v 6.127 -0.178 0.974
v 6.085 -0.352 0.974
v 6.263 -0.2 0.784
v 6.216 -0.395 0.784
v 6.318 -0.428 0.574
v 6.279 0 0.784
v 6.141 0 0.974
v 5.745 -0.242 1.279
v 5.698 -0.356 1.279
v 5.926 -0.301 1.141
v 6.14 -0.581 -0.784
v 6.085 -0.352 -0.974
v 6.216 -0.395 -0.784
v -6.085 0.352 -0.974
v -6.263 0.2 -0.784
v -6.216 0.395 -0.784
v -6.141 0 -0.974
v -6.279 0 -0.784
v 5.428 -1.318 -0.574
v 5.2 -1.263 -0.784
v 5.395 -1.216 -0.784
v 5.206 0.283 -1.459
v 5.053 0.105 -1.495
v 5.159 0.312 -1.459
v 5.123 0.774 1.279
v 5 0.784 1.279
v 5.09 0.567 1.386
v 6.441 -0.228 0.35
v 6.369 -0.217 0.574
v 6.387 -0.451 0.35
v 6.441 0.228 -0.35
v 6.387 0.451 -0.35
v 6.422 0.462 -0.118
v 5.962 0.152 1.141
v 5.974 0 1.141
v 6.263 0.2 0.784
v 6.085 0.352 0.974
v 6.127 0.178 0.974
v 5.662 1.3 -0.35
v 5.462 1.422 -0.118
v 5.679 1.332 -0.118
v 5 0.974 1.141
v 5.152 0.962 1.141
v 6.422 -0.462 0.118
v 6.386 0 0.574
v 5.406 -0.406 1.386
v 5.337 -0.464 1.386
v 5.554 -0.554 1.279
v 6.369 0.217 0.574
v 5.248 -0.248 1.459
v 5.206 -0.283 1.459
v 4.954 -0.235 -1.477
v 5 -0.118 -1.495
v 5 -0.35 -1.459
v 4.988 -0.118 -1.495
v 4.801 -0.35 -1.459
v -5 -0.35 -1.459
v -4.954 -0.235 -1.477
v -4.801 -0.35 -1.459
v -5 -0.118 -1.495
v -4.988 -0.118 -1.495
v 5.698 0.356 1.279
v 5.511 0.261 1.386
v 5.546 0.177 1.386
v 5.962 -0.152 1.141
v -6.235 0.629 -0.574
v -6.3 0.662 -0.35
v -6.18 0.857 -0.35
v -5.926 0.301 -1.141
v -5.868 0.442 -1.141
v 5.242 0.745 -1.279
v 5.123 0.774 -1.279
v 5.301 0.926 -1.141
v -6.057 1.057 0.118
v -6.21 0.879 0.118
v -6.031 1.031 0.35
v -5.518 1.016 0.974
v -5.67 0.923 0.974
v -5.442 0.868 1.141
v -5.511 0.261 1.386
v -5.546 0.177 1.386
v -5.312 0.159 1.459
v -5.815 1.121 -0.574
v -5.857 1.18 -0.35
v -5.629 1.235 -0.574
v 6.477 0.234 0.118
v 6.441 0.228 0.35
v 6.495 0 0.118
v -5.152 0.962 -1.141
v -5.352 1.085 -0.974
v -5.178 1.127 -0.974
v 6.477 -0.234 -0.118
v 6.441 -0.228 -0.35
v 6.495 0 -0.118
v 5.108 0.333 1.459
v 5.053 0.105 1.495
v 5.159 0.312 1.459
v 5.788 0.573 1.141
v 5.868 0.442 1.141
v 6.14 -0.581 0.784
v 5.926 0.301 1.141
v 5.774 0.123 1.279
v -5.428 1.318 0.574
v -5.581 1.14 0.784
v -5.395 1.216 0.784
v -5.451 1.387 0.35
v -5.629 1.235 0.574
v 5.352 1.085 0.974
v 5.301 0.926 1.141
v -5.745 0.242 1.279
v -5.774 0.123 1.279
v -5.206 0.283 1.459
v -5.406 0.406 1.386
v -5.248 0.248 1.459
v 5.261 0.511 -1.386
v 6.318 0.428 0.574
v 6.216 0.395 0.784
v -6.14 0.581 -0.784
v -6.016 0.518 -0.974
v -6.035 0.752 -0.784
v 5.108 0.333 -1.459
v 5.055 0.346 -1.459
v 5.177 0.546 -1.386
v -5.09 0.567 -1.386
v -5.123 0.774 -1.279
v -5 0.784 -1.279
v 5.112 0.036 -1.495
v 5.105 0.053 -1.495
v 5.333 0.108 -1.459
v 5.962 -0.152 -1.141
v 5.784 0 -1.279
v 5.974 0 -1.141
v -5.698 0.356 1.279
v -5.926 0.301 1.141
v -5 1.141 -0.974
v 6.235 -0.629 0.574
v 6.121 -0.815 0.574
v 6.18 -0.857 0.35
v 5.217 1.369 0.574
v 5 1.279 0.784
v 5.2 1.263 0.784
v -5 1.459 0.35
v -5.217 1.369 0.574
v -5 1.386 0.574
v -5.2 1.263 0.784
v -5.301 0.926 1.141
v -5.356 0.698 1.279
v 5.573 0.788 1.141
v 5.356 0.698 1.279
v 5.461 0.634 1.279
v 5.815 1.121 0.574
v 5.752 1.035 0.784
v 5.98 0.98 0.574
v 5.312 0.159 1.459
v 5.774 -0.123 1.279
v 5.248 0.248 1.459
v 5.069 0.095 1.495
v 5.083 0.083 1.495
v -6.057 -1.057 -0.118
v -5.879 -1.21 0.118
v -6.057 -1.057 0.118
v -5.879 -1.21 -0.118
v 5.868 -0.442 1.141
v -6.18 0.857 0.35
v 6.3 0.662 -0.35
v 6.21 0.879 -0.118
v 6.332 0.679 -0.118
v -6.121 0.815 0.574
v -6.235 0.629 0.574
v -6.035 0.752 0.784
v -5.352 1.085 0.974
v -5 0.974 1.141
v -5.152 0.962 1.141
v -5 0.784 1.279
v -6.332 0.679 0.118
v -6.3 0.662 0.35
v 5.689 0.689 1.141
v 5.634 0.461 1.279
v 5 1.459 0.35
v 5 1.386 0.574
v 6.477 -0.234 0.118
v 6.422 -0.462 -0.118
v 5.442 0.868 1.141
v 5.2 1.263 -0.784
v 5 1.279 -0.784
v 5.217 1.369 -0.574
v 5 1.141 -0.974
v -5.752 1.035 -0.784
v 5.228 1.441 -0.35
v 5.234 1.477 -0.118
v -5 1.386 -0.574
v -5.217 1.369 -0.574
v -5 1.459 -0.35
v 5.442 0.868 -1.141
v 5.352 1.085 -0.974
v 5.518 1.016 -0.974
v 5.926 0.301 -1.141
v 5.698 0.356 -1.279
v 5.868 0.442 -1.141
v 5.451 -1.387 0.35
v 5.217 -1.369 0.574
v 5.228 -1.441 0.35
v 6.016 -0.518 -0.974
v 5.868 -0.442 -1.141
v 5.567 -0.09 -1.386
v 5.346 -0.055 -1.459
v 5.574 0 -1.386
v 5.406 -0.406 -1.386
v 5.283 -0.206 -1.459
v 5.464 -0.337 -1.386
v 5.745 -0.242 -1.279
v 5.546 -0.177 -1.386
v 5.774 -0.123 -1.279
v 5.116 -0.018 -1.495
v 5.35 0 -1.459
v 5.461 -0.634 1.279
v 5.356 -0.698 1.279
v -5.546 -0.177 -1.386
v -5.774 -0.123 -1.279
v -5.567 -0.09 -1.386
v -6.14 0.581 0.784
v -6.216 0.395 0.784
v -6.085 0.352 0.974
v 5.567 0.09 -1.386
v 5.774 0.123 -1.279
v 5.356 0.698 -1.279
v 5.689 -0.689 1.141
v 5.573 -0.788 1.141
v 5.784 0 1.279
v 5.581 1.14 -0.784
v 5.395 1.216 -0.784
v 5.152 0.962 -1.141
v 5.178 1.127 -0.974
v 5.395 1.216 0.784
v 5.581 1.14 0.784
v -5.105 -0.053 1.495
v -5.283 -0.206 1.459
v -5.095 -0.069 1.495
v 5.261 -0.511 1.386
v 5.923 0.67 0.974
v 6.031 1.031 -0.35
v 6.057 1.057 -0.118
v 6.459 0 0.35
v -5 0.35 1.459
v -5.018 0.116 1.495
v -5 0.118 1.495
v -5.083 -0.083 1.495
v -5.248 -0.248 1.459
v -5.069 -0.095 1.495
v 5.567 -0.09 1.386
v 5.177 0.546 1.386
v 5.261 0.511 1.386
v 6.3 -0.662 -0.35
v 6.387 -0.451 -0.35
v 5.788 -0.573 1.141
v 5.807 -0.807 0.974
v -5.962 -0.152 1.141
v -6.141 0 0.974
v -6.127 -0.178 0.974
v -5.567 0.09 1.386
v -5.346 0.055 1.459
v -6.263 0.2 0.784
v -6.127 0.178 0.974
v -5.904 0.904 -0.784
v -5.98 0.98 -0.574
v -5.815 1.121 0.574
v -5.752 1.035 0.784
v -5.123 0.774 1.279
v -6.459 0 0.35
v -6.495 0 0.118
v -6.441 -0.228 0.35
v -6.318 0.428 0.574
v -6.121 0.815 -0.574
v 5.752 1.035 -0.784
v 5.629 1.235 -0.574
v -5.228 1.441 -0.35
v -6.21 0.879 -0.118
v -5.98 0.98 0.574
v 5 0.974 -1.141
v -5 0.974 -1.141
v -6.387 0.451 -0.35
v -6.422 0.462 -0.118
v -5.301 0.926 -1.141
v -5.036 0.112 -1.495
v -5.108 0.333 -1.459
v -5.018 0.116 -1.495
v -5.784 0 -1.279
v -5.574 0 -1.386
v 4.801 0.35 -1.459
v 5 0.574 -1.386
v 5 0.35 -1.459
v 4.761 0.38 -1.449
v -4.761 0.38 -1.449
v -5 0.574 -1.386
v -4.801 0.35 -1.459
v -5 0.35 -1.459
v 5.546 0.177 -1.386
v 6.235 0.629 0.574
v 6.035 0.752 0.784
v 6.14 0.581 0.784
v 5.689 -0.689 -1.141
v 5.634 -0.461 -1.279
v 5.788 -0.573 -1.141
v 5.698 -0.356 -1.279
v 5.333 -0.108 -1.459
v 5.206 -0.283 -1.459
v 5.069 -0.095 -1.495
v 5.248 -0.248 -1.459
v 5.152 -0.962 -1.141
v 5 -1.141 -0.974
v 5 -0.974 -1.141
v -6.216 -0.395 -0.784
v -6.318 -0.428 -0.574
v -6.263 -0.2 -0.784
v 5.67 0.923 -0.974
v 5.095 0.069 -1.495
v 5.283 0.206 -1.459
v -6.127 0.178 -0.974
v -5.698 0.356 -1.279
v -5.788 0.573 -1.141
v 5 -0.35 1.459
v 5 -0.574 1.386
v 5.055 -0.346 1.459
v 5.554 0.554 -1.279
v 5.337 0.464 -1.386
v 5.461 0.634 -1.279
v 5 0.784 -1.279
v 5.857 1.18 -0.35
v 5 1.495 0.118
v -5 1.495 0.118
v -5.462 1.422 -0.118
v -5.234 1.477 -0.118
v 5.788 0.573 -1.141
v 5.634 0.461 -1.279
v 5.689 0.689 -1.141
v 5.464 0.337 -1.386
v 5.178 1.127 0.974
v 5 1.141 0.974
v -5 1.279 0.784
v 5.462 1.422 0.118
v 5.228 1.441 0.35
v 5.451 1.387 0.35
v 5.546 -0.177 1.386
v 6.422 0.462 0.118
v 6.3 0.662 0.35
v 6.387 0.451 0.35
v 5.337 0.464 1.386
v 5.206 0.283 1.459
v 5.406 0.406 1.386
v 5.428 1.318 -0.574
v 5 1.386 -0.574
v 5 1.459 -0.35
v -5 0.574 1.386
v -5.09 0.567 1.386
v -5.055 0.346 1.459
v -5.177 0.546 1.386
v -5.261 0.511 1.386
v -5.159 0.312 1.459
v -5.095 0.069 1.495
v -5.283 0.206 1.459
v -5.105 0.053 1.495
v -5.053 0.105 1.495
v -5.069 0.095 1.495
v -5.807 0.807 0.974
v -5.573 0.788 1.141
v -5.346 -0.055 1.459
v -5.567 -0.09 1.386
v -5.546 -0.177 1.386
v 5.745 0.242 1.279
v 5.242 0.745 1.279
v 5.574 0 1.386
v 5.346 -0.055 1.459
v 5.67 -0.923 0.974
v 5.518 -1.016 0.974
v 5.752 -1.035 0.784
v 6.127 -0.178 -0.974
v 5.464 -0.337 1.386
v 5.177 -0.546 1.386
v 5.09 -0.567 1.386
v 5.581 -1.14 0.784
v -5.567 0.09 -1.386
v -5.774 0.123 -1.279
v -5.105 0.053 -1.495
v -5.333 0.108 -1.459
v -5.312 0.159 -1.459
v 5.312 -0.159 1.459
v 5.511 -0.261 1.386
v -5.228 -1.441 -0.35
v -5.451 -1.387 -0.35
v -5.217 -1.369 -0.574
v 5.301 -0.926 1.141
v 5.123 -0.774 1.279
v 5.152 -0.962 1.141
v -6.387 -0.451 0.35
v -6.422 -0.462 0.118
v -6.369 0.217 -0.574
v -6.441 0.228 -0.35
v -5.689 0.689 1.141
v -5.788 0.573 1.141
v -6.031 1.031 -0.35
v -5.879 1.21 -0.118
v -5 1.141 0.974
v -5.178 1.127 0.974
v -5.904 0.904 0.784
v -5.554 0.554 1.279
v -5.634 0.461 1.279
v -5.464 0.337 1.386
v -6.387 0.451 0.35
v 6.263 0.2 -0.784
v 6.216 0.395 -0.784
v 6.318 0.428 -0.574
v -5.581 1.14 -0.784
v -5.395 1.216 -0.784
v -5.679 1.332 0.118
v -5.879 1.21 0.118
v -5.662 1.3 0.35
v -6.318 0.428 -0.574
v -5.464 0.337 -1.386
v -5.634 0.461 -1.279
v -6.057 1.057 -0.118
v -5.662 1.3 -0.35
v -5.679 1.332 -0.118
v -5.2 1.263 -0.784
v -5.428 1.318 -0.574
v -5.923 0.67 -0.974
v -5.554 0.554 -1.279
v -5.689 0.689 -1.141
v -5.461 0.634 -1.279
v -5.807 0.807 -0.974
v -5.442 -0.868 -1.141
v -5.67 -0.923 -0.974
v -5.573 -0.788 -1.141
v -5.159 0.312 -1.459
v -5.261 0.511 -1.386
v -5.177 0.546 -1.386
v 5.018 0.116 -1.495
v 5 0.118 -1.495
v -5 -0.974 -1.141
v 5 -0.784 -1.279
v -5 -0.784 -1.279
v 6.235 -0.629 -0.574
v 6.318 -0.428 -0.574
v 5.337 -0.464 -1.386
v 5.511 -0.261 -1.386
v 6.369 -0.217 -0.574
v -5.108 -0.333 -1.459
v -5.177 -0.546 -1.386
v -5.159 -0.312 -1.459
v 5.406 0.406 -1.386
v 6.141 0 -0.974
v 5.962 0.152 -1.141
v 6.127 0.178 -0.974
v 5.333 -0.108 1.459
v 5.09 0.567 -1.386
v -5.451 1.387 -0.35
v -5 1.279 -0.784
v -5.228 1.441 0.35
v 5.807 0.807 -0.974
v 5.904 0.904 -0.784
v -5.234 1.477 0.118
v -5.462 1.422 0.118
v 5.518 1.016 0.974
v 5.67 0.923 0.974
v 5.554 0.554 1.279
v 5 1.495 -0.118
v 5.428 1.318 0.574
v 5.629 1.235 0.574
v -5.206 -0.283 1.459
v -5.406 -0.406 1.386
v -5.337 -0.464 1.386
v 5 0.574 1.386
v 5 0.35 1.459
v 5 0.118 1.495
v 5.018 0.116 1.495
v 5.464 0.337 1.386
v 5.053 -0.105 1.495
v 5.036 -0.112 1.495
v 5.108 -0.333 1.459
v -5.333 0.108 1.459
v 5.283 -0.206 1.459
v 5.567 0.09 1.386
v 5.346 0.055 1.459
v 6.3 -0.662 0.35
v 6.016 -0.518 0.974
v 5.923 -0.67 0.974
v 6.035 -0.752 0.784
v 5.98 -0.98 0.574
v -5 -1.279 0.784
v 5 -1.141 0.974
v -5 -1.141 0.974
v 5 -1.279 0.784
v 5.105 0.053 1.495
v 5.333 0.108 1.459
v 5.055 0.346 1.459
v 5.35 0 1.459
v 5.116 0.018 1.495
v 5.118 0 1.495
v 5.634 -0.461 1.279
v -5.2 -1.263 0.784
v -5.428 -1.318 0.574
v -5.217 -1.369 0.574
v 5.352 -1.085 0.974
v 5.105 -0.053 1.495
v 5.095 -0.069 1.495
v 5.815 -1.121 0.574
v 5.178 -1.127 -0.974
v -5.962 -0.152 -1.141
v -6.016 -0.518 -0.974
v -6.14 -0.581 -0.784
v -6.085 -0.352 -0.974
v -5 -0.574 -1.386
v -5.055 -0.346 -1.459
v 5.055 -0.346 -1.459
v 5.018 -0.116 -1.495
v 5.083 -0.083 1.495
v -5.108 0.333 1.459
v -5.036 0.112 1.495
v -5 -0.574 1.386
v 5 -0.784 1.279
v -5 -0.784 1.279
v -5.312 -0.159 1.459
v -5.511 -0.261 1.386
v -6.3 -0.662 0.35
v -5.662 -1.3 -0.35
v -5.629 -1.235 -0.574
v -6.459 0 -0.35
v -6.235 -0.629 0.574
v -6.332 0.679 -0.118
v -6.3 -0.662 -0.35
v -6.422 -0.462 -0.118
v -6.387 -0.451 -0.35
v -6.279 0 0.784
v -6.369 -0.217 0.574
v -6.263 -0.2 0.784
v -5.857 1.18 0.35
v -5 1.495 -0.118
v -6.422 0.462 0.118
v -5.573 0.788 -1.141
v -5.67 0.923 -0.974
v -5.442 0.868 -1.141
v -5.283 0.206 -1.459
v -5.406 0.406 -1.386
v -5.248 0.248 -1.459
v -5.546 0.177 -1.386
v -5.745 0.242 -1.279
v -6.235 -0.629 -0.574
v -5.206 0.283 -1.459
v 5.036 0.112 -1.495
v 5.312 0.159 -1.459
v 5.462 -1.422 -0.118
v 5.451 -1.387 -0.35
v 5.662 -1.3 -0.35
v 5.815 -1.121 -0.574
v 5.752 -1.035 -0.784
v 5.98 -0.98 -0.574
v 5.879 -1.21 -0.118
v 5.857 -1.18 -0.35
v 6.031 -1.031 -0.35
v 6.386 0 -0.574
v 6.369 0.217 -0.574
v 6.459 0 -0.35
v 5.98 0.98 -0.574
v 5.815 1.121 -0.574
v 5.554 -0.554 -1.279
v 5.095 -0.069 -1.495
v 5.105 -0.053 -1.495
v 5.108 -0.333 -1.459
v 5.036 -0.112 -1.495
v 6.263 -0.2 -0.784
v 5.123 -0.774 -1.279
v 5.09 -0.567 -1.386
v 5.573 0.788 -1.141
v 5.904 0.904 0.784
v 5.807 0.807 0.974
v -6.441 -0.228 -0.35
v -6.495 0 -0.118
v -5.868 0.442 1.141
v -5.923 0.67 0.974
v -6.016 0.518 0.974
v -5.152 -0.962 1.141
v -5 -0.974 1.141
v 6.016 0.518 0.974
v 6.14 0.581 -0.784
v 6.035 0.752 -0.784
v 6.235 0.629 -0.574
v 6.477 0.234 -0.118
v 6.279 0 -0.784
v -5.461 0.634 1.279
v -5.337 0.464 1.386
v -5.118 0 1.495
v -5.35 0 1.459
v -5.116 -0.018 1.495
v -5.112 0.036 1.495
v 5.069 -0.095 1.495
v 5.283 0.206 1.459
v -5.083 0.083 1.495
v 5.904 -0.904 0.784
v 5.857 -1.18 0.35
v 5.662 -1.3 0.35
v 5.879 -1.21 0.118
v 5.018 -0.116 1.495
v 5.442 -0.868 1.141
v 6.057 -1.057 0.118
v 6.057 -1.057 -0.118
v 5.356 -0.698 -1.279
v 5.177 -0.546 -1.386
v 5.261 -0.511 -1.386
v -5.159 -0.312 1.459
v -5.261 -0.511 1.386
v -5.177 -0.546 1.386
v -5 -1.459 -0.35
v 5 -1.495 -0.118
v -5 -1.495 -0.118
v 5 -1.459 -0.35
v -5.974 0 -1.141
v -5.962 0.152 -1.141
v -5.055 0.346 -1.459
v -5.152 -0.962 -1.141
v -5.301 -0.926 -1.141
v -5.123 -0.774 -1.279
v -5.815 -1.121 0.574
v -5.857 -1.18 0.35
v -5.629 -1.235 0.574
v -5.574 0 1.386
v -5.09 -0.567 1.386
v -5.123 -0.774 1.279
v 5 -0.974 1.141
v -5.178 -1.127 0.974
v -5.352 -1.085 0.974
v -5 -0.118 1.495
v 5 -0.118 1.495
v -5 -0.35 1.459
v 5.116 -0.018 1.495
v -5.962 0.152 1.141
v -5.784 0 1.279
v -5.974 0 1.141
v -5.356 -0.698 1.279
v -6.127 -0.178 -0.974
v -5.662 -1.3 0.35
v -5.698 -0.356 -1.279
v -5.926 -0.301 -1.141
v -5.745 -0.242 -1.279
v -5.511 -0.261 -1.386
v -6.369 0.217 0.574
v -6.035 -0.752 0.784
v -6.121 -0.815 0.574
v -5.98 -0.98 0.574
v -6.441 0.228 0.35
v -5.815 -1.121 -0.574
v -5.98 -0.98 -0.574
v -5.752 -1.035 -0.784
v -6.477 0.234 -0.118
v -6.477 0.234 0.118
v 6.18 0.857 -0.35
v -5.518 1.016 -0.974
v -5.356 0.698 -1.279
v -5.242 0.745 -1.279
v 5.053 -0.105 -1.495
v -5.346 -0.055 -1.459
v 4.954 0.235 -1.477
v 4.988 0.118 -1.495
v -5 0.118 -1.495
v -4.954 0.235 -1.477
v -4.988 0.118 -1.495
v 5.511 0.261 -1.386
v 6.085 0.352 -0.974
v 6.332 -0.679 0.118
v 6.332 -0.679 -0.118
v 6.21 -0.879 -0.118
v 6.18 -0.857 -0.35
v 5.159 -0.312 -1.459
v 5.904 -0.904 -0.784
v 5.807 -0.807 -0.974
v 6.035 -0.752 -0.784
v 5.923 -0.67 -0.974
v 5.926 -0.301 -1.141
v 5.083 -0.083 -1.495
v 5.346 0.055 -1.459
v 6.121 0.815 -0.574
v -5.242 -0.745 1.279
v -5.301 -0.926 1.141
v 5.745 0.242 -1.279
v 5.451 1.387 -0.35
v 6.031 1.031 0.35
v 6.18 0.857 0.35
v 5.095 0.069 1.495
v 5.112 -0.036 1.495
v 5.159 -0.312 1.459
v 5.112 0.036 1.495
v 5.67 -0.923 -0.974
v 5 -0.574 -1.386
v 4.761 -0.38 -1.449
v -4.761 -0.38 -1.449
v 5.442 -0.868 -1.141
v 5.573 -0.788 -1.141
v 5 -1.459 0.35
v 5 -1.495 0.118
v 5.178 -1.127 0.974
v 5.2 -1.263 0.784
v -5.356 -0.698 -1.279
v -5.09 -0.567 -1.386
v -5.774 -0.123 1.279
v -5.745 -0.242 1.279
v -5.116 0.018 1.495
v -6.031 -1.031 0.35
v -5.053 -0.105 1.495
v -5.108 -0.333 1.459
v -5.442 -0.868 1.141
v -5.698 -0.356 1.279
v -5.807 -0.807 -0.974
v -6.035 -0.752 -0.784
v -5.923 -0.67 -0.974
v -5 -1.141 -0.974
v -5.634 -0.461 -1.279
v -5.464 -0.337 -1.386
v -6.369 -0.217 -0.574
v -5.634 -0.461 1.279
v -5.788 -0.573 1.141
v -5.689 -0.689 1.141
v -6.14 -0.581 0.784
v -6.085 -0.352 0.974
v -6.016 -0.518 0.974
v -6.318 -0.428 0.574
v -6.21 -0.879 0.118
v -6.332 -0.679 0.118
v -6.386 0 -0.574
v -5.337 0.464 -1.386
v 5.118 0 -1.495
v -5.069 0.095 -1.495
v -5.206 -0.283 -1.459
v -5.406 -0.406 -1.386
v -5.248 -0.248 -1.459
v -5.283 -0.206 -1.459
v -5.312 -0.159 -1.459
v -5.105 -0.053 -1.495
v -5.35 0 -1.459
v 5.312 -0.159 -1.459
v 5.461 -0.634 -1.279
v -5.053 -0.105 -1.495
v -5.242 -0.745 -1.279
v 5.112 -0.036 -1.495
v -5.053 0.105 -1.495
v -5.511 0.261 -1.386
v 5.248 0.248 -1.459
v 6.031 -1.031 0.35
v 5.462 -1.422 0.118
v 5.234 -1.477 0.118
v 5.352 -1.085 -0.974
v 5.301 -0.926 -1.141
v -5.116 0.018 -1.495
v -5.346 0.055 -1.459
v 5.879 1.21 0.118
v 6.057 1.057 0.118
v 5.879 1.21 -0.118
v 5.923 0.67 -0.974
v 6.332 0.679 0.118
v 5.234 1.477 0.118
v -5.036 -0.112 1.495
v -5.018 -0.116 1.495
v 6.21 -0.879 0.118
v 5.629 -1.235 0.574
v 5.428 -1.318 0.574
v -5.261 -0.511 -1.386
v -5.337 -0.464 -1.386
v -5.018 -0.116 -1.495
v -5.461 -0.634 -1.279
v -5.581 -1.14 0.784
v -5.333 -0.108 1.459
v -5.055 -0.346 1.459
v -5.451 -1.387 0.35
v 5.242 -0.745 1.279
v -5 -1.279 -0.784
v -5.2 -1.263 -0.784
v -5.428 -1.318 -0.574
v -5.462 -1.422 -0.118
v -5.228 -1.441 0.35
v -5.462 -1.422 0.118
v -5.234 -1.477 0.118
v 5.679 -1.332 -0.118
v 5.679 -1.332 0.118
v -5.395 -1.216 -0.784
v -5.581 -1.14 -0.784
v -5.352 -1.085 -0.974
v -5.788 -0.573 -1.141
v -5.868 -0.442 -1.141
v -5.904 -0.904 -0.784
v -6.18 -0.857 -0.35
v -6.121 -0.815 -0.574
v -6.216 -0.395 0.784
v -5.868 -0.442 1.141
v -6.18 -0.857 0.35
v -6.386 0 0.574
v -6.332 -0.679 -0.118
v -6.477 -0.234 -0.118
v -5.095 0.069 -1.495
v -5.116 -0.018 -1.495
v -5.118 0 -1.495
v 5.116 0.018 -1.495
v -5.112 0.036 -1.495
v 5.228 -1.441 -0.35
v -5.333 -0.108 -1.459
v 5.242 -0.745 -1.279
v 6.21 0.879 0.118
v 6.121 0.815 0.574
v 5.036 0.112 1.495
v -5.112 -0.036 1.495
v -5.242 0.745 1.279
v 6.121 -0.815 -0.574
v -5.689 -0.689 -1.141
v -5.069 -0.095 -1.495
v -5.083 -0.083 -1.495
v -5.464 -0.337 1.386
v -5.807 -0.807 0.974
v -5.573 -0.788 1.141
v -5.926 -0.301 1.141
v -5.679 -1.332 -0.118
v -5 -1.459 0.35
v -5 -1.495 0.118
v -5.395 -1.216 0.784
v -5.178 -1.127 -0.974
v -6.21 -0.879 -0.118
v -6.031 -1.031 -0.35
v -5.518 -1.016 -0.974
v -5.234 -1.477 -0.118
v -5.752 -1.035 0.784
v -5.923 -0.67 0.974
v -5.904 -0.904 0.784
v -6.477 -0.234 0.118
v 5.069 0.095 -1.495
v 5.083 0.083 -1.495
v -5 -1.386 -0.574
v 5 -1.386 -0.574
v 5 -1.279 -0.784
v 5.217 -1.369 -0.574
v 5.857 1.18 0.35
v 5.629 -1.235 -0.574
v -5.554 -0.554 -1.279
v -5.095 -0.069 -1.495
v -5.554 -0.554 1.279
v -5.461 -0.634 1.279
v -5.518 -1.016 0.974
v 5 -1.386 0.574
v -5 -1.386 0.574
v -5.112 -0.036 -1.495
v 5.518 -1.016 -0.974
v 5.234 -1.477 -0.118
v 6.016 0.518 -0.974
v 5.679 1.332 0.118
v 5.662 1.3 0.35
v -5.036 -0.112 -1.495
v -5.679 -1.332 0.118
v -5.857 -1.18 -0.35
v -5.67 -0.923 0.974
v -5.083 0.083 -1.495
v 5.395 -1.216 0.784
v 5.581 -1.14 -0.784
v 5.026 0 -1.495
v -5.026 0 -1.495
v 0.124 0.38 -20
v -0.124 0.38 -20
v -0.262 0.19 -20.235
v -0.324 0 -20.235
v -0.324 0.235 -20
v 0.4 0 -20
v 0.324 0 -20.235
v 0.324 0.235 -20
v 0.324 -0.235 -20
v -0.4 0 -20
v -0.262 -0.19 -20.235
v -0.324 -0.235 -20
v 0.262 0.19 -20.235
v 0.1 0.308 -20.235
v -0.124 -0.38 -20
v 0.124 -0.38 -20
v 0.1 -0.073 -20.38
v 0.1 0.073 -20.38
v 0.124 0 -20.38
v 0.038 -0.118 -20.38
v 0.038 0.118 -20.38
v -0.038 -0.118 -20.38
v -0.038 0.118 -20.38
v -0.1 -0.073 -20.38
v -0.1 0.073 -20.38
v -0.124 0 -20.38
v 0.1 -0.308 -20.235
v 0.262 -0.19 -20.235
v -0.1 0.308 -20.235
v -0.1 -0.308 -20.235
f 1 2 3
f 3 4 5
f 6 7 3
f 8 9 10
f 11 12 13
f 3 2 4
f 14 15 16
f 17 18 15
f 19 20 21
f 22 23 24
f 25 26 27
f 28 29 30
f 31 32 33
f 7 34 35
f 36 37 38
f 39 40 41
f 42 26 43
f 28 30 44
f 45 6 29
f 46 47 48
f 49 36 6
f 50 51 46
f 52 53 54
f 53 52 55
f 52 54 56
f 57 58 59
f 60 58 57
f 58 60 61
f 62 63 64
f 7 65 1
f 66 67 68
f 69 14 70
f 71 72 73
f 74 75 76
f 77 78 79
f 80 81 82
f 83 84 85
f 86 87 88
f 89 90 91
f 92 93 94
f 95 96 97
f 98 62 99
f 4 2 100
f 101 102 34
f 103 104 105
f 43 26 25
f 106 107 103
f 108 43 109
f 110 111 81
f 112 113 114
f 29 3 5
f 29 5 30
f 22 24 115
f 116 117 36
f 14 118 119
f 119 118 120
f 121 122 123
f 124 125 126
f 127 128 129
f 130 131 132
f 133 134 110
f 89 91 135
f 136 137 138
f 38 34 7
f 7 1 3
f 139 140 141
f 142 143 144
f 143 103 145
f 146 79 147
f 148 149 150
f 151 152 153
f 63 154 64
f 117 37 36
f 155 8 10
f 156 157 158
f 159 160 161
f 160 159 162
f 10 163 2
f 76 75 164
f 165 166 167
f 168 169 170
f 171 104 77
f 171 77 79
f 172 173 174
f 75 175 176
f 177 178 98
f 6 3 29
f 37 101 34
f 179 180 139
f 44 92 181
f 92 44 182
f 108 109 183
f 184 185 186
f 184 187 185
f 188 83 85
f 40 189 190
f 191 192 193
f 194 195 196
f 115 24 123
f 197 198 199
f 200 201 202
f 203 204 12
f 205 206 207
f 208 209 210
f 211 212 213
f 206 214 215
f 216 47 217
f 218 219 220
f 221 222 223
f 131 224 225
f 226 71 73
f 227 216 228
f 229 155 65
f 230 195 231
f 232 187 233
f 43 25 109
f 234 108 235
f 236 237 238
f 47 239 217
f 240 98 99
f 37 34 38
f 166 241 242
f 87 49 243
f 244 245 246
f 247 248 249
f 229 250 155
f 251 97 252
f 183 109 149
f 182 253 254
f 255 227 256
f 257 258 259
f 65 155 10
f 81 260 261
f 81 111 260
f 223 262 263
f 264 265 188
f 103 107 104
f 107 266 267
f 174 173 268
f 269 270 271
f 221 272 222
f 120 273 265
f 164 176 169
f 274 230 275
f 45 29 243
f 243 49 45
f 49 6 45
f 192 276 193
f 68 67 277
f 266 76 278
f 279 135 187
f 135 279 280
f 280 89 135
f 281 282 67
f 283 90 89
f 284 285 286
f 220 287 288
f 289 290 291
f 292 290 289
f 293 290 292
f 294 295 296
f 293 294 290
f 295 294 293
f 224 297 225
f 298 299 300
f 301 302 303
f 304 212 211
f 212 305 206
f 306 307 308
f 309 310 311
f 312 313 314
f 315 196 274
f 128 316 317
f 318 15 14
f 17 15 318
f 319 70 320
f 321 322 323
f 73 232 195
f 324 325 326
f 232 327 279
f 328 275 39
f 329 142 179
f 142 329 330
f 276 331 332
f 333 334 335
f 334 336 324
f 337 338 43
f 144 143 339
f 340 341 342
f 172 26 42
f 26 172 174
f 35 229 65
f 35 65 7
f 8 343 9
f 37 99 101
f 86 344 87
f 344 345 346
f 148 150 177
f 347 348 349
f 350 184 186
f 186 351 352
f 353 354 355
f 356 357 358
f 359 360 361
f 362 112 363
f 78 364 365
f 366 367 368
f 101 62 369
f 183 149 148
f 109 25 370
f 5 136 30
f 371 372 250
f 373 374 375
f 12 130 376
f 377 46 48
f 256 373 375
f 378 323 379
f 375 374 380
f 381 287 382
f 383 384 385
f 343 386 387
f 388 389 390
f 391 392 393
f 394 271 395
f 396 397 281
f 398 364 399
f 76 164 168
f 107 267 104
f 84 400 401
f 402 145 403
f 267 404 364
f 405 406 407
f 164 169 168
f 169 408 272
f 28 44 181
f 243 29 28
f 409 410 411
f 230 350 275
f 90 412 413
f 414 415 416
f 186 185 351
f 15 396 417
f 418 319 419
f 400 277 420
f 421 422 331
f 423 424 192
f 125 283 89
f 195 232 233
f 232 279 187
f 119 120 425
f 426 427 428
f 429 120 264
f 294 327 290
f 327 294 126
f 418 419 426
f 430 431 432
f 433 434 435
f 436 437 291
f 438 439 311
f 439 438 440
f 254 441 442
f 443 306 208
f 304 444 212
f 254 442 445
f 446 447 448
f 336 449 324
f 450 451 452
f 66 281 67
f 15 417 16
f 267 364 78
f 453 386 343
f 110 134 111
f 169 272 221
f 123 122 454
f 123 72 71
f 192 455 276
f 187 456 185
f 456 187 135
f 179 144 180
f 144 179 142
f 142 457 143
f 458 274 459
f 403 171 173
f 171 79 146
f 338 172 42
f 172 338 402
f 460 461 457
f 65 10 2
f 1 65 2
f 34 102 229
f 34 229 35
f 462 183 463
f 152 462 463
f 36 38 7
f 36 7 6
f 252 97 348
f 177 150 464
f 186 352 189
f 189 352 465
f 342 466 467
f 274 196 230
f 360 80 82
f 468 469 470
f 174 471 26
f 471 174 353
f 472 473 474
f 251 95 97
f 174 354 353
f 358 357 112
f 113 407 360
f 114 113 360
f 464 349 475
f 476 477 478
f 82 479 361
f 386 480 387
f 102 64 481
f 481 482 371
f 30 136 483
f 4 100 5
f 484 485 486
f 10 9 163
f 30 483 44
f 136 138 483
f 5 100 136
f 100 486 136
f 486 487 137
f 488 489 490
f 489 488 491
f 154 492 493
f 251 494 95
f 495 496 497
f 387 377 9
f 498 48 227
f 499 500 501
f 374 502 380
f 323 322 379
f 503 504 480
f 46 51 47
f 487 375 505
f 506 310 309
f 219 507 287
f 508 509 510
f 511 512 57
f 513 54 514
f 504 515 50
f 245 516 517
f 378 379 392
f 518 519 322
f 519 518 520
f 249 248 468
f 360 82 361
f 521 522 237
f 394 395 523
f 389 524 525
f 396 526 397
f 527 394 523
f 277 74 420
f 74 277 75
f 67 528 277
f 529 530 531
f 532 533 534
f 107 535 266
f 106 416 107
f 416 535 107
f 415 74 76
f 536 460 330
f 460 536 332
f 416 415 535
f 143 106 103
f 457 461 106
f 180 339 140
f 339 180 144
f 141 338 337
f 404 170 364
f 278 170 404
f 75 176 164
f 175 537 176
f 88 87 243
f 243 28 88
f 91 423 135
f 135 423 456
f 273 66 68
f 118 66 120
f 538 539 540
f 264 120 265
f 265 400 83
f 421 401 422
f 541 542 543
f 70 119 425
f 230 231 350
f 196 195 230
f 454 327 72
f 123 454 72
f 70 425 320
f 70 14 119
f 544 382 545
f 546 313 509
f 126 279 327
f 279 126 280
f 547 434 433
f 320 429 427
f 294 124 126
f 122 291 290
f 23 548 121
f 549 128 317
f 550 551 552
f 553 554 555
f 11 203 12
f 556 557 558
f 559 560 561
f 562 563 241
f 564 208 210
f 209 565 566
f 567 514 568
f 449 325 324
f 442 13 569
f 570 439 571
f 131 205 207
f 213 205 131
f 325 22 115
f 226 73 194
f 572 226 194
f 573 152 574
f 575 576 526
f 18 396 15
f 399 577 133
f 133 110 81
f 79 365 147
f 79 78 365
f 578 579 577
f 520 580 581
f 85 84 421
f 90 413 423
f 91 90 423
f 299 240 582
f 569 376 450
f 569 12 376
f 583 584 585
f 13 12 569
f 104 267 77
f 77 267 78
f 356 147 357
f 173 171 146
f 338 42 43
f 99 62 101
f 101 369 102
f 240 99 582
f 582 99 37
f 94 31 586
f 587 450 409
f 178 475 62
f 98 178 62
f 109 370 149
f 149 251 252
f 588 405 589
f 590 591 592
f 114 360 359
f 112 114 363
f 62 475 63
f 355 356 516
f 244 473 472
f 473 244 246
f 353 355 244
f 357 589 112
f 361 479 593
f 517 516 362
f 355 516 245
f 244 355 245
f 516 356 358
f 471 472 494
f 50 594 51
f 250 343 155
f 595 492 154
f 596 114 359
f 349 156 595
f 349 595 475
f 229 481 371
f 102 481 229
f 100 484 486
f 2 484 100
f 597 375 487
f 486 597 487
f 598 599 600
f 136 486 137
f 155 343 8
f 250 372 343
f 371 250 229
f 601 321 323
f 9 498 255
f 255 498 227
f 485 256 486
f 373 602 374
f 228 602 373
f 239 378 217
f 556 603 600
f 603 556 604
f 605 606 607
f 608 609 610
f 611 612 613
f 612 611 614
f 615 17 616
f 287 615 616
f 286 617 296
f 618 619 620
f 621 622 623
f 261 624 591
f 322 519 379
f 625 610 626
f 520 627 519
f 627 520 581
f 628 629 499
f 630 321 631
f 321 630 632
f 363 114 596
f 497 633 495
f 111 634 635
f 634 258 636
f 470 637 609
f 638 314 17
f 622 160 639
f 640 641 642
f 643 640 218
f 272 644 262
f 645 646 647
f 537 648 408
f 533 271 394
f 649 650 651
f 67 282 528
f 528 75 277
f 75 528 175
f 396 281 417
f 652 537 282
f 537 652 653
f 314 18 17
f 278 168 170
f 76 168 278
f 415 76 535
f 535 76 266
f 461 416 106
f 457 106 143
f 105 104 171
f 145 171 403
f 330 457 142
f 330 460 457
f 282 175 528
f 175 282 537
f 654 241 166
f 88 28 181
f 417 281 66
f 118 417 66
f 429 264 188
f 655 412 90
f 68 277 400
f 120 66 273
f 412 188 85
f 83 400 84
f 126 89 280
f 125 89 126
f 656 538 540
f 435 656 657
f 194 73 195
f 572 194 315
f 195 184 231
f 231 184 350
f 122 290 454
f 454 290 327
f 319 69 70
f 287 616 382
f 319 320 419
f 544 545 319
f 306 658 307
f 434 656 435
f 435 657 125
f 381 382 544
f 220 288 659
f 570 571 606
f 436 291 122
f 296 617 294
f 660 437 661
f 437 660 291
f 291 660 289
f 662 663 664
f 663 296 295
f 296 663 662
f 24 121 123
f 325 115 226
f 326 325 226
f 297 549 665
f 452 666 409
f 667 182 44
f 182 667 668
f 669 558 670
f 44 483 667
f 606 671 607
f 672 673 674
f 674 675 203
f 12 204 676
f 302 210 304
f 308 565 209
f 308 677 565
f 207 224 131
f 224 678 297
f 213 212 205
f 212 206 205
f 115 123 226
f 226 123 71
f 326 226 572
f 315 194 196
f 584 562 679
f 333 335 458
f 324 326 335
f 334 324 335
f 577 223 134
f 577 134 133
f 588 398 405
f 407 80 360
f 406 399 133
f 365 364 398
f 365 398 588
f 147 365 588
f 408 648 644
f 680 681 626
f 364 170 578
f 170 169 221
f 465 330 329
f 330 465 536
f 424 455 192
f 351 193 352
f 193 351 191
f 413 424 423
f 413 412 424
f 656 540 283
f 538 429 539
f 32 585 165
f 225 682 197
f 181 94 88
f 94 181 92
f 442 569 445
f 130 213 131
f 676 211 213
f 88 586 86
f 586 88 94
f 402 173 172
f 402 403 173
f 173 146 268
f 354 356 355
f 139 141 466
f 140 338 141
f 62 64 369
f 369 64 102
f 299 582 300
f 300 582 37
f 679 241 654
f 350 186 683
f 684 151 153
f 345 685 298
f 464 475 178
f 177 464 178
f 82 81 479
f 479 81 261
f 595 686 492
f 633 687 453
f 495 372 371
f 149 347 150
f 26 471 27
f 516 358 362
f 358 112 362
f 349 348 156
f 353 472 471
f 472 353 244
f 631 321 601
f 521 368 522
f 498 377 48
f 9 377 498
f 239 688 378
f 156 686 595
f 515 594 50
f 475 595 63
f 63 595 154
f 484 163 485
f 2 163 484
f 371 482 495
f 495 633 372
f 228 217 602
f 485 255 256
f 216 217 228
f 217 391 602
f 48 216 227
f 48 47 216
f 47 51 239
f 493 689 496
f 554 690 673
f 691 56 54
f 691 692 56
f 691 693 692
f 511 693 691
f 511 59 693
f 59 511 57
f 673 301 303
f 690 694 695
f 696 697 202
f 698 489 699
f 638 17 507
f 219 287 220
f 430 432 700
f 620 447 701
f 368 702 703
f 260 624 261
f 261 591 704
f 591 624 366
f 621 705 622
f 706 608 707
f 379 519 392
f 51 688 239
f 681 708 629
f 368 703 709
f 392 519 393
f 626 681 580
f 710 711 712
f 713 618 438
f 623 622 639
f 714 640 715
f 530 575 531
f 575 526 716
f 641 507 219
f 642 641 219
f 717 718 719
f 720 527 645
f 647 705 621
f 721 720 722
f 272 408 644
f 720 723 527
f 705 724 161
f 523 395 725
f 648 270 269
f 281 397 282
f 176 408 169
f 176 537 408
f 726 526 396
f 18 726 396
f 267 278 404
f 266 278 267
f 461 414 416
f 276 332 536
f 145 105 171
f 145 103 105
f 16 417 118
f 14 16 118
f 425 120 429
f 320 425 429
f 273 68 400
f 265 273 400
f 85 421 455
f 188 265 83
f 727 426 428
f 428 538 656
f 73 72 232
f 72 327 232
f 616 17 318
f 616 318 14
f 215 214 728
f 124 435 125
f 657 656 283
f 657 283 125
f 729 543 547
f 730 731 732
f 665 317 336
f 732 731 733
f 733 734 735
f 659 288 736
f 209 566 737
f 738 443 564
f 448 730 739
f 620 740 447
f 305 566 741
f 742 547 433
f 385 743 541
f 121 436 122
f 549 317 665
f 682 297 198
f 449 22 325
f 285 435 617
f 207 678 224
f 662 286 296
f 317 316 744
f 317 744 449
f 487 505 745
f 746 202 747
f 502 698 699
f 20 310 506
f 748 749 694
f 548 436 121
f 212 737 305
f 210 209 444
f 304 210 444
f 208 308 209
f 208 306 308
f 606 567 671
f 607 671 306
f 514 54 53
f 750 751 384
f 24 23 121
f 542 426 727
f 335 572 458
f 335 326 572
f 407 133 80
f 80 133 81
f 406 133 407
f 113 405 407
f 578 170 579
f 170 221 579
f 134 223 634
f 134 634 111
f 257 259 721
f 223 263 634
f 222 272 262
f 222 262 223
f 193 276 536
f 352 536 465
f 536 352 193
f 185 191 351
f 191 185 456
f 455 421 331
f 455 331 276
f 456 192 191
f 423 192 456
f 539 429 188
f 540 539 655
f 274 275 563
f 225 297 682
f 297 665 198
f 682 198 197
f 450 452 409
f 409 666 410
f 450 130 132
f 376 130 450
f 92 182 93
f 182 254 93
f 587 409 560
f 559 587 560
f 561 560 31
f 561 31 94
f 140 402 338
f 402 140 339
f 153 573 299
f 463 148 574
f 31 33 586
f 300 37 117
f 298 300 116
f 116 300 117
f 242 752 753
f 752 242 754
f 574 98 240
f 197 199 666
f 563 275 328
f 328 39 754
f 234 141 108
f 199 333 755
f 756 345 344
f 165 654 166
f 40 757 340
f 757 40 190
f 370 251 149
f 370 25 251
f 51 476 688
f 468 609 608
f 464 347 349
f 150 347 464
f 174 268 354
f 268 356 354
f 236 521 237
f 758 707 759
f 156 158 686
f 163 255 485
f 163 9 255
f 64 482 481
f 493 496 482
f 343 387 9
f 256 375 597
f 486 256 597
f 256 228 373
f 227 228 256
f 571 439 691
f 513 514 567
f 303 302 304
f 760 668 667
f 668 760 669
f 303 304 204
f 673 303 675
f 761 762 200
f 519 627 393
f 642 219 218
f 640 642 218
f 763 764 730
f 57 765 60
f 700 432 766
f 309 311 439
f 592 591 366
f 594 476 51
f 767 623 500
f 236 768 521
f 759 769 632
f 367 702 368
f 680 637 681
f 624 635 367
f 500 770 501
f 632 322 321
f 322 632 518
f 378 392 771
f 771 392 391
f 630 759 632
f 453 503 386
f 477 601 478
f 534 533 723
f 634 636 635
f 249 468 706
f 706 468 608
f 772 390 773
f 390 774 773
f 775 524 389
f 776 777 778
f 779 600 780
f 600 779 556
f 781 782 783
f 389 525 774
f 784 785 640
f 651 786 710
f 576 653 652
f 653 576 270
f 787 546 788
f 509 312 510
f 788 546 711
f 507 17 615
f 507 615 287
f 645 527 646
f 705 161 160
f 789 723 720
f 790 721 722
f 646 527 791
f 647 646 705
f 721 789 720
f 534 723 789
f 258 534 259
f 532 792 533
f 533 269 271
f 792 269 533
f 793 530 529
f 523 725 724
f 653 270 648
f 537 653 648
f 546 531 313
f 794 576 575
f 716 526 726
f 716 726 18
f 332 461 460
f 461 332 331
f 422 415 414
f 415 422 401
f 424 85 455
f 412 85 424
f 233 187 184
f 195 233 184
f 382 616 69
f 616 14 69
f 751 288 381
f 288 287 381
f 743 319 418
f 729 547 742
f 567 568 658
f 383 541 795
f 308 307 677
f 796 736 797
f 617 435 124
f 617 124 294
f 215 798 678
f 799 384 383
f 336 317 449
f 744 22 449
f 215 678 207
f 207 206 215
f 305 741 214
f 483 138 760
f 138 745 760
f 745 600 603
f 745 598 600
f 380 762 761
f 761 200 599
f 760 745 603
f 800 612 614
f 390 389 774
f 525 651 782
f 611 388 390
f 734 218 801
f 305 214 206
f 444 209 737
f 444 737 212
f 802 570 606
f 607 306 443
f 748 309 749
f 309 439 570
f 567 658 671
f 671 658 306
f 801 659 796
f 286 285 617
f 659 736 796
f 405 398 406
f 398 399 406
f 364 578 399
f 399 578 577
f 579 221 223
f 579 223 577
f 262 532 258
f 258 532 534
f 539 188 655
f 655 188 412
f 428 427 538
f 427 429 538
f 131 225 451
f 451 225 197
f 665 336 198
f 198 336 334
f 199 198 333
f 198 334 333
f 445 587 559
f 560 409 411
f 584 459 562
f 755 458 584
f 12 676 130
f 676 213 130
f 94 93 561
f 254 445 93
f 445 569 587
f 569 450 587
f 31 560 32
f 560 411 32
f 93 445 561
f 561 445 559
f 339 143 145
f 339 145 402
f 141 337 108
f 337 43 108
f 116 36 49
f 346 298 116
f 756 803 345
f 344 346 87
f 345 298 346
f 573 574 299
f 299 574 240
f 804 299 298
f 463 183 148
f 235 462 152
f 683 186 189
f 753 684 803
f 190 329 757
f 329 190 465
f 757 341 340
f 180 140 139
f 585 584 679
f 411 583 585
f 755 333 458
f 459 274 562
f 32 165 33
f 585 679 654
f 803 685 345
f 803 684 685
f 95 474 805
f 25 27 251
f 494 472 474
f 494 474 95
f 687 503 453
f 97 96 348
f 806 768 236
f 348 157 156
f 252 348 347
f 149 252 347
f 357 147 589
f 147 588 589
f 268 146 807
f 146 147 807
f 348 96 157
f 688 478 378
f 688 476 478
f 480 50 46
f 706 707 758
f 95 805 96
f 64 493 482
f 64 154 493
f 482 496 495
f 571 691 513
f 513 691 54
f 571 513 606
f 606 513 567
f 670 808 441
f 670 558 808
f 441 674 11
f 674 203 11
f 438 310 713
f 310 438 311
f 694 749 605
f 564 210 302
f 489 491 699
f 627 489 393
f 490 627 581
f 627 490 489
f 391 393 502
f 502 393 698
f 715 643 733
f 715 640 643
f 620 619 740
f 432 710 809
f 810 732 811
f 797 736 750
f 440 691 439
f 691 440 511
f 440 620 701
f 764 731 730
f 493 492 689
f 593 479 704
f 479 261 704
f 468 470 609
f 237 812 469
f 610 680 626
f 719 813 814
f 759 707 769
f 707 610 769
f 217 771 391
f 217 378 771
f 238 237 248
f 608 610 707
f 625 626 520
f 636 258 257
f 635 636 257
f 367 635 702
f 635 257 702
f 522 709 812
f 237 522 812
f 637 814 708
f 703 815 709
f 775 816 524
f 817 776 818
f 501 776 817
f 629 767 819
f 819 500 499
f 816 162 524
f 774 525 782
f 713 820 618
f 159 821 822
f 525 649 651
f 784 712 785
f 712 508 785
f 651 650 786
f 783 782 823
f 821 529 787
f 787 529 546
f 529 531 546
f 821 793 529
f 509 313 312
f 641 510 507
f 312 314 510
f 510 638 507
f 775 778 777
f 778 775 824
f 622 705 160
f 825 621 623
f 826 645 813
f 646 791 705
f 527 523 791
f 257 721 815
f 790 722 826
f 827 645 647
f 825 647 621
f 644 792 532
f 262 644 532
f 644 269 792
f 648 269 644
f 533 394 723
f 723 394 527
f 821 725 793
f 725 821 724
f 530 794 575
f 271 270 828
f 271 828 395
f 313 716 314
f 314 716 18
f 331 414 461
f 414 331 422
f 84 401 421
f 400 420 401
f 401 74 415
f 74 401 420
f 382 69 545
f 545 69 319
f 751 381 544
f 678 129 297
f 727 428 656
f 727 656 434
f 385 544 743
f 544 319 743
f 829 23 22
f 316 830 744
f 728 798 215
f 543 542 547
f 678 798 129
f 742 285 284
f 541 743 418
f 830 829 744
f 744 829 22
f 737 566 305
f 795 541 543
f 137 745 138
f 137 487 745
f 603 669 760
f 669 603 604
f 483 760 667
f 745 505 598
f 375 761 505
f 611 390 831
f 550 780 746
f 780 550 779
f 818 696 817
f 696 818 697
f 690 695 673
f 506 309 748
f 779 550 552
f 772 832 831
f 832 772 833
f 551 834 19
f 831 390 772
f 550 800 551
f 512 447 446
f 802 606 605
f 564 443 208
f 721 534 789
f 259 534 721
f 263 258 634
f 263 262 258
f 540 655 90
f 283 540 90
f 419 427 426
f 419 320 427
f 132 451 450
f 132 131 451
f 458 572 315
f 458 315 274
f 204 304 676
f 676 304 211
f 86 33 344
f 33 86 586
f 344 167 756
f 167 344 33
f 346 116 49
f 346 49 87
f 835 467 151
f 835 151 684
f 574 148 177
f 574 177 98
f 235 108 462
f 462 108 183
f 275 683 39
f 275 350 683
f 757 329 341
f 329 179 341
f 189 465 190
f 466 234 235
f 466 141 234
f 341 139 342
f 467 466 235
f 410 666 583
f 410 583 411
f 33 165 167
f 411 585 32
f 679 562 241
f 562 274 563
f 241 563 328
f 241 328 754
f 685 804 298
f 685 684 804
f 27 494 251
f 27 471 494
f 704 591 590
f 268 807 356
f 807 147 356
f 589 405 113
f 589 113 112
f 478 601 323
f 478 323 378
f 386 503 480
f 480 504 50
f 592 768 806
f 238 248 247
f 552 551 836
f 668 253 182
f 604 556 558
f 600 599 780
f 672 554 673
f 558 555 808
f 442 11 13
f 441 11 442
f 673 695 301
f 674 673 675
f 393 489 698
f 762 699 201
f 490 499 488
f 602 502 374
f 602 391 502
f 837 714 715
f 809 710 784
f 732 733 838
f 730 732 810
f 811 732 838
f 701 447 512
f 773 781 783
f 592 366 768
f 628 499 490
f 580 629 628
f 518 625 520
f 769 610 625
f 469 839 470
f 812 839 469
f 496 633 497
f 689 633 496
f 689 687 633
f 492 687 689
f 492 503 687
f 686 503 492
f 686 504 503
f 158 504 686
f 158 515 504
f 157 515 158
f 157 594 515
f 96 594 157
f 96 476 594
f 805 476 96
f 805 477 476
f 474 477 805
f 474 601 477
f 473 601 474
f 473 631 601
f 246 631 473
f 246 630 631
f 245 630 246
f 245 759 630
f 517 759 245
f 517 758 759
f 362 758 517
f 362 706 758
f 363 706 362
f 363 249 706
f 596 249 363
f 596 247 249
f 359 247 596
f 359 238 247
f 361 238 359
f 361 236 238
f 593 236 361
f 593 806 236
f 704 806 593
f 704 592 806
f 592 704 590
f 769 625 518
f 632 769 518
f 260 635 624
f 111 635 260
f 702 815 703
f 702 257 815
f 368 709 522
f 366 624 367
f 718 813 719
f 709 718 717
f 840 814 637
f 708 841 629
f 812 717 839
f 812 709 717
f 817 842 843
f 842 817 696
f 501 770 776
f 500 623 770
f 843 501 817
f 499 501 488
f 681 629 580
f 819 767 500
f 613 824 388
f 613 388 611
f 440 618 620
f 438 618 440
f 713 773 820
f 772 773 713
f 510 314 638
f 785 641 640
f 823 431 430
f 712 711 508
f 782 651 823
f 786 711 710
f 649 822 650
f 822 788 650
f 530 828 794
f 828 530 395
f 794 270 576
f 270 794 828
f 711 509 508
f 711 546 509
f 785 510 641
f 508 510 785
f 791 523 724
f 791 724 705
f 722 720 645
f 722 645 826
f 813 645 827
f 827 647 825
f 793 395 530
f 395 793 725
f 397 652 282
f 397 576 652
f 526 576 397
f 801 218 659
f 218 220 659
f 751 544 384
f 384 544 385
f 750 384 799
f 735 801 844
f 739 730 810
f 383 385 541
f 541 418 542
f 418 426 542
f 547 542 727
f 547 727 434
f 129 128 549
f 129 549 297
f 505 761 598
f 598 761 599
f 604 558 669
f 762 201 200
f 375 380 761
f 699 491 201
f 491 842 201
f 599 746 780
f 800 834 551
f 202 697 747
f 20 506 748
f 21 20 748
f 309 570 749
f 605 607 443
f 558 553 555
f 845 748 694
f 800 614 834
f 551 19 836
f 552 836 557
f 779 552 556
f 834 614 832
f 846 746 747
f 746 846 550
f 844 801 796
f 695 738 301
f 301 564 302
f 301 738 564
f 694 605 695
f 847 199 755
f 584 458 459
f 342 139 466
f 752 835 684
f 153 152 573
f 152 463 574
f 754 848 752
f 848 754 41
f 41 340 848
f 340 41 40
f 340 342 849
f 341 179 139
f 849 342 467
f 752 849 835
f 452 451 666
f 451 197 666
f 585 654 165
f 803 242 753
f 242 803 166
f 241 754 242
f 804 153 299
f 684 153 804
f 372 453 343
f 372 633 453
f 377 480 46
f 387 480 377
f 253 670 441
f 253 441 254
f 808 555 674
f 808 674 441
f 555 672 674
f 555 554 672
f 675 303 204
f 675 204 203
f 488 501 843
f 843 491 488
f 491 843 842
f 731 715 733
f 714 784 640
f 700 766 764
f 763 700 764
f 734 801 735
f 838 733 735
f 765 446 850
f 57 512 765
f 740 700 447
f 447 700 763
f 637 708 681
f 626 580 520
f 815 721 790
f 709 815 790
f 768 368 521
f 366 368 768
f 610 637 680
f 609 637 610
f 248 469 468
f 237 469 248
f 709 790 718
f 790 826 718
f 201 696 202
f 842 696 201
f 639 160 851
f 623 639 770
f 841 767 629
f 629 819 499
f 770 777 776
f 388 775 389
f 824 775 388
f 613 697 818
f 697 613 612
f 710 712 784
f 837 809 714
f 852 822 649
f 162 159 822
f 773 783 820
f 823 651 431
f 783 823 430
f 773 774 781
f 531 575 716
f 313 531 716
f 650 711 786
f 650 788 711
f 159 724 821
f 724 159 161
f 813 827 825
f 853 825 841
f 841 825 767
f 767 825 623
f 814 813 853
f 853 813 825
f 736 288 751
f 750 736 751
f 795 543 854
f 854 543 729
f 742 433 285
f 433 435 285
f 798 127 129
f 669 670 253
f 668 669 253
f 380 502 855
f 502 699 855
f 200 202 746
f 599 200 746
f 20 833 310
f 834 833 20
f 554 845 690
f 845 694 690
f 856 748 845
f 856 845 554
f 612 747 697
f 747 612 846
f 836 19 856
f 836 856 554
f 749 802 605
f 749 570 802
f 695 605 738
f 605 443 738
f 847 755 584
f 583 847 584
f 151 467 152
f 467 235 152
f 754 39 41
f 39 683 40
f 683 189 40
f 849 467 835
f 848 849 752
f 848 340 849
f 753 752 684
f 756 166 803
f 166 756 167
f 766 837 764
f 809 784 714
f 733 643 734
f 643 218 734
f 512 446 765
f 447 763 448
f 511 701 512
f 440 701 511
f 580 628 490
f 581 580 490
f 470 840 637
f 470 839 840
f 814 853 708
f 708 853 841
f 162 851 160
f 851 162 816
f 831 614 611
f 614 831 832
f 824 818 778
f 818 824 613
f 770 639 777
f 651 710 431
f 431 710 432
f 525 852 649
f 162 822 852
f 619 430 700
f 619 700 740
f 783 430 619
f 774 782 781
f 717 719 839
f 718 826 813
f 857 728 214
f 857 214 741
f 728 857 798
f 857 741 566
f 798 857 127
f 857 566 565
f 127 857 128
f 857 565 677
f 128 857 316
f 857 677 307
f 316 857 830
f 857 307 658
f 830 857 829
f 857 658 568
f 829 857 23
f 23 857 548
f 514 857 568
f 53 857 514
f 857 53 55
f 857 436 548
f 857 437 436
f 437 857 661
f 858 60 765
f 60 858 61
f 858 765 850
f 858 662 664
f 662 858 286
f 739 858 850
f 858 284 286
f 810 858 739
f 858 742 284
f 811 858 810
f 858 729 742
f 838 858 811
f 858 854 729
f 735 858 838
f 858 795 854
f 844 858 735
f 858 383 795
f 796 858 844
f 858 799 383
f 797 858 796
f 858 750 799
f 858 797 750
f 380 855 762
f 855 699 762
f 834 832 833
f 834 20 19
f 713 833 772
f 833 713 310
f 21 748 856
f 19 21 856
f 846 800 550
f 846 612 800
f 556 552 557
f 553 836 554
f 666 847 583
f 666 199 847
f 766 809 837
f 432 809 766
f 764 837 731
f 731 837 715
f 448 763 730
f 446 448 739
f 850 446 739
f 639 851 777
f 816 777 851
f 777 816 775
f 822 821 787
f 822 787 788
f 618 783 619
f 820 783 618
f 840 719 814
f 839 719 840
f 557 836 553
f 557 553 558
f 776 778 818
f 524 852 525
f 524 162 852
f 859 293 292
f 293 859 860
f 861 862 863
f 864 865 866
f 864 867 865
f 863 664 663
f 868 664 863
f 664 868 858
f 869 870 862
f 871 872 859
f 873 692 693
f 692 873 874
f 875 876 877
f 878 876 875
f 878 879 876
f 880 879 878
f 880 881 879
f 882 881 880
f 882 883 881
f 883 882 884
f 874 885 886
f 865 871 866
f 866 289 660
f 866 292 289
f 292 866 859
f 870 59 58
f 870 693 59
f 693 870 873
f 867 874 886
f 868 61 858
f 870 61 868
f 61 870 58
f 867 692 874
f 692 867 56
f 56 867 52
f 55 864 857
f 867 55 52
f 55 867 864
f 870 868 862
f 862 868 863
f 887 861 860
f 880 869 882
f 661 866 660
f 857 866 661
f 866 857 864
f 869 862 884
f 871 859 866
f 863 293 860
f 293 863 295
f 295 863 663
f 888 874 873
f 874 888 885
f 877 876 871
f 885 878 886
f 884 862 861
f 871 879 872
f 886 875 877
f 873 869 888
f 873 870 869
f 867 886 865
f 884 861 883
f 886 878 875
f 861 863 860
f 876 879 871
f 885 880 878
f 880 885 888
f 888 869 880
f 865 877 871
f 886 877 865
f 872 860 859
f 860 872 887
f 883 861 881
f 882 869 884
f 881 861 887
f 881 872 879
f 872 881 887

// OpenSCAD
// Edge strut diameter (mm).
EDGE_SEG_EDGE_T = 3;
// Support fin diameter (mm).
EDGE_SEG_FIN_T = 0.8;


module edge_seg(len, pc, r_poly, edge_t = EDGE_SEG_EDGE_T, fin_t = EDGE_SEG_FIN_T) {
    translate([0, 0, 0]) {
        // builds the edge bar itself
        hull() {
            translate([len/2, 0, 0]) sphere(d = edge_t, $fn = 40);
            translate([-len/2, 0, 0]) sphere(d = edge_t, $fn = 40);
//            translate([0, 0, -EDGE_T/4]) cube([len, EDGE_T, EDGE_T/2], center = true);
        }
        
        // creates the support fin under the edge
        hull() {
            translate([len/2,0,0]) sphere(d = fin_t, $fn = 10);
            translate([-len/2,0,0]) sphere(d = fin_t, $fn = 10);
            translate(pc) sphere(d = fin_t, $fn = 10);
        }
    }    
} 

edge_seg(10, [0,0,-20], 20);
